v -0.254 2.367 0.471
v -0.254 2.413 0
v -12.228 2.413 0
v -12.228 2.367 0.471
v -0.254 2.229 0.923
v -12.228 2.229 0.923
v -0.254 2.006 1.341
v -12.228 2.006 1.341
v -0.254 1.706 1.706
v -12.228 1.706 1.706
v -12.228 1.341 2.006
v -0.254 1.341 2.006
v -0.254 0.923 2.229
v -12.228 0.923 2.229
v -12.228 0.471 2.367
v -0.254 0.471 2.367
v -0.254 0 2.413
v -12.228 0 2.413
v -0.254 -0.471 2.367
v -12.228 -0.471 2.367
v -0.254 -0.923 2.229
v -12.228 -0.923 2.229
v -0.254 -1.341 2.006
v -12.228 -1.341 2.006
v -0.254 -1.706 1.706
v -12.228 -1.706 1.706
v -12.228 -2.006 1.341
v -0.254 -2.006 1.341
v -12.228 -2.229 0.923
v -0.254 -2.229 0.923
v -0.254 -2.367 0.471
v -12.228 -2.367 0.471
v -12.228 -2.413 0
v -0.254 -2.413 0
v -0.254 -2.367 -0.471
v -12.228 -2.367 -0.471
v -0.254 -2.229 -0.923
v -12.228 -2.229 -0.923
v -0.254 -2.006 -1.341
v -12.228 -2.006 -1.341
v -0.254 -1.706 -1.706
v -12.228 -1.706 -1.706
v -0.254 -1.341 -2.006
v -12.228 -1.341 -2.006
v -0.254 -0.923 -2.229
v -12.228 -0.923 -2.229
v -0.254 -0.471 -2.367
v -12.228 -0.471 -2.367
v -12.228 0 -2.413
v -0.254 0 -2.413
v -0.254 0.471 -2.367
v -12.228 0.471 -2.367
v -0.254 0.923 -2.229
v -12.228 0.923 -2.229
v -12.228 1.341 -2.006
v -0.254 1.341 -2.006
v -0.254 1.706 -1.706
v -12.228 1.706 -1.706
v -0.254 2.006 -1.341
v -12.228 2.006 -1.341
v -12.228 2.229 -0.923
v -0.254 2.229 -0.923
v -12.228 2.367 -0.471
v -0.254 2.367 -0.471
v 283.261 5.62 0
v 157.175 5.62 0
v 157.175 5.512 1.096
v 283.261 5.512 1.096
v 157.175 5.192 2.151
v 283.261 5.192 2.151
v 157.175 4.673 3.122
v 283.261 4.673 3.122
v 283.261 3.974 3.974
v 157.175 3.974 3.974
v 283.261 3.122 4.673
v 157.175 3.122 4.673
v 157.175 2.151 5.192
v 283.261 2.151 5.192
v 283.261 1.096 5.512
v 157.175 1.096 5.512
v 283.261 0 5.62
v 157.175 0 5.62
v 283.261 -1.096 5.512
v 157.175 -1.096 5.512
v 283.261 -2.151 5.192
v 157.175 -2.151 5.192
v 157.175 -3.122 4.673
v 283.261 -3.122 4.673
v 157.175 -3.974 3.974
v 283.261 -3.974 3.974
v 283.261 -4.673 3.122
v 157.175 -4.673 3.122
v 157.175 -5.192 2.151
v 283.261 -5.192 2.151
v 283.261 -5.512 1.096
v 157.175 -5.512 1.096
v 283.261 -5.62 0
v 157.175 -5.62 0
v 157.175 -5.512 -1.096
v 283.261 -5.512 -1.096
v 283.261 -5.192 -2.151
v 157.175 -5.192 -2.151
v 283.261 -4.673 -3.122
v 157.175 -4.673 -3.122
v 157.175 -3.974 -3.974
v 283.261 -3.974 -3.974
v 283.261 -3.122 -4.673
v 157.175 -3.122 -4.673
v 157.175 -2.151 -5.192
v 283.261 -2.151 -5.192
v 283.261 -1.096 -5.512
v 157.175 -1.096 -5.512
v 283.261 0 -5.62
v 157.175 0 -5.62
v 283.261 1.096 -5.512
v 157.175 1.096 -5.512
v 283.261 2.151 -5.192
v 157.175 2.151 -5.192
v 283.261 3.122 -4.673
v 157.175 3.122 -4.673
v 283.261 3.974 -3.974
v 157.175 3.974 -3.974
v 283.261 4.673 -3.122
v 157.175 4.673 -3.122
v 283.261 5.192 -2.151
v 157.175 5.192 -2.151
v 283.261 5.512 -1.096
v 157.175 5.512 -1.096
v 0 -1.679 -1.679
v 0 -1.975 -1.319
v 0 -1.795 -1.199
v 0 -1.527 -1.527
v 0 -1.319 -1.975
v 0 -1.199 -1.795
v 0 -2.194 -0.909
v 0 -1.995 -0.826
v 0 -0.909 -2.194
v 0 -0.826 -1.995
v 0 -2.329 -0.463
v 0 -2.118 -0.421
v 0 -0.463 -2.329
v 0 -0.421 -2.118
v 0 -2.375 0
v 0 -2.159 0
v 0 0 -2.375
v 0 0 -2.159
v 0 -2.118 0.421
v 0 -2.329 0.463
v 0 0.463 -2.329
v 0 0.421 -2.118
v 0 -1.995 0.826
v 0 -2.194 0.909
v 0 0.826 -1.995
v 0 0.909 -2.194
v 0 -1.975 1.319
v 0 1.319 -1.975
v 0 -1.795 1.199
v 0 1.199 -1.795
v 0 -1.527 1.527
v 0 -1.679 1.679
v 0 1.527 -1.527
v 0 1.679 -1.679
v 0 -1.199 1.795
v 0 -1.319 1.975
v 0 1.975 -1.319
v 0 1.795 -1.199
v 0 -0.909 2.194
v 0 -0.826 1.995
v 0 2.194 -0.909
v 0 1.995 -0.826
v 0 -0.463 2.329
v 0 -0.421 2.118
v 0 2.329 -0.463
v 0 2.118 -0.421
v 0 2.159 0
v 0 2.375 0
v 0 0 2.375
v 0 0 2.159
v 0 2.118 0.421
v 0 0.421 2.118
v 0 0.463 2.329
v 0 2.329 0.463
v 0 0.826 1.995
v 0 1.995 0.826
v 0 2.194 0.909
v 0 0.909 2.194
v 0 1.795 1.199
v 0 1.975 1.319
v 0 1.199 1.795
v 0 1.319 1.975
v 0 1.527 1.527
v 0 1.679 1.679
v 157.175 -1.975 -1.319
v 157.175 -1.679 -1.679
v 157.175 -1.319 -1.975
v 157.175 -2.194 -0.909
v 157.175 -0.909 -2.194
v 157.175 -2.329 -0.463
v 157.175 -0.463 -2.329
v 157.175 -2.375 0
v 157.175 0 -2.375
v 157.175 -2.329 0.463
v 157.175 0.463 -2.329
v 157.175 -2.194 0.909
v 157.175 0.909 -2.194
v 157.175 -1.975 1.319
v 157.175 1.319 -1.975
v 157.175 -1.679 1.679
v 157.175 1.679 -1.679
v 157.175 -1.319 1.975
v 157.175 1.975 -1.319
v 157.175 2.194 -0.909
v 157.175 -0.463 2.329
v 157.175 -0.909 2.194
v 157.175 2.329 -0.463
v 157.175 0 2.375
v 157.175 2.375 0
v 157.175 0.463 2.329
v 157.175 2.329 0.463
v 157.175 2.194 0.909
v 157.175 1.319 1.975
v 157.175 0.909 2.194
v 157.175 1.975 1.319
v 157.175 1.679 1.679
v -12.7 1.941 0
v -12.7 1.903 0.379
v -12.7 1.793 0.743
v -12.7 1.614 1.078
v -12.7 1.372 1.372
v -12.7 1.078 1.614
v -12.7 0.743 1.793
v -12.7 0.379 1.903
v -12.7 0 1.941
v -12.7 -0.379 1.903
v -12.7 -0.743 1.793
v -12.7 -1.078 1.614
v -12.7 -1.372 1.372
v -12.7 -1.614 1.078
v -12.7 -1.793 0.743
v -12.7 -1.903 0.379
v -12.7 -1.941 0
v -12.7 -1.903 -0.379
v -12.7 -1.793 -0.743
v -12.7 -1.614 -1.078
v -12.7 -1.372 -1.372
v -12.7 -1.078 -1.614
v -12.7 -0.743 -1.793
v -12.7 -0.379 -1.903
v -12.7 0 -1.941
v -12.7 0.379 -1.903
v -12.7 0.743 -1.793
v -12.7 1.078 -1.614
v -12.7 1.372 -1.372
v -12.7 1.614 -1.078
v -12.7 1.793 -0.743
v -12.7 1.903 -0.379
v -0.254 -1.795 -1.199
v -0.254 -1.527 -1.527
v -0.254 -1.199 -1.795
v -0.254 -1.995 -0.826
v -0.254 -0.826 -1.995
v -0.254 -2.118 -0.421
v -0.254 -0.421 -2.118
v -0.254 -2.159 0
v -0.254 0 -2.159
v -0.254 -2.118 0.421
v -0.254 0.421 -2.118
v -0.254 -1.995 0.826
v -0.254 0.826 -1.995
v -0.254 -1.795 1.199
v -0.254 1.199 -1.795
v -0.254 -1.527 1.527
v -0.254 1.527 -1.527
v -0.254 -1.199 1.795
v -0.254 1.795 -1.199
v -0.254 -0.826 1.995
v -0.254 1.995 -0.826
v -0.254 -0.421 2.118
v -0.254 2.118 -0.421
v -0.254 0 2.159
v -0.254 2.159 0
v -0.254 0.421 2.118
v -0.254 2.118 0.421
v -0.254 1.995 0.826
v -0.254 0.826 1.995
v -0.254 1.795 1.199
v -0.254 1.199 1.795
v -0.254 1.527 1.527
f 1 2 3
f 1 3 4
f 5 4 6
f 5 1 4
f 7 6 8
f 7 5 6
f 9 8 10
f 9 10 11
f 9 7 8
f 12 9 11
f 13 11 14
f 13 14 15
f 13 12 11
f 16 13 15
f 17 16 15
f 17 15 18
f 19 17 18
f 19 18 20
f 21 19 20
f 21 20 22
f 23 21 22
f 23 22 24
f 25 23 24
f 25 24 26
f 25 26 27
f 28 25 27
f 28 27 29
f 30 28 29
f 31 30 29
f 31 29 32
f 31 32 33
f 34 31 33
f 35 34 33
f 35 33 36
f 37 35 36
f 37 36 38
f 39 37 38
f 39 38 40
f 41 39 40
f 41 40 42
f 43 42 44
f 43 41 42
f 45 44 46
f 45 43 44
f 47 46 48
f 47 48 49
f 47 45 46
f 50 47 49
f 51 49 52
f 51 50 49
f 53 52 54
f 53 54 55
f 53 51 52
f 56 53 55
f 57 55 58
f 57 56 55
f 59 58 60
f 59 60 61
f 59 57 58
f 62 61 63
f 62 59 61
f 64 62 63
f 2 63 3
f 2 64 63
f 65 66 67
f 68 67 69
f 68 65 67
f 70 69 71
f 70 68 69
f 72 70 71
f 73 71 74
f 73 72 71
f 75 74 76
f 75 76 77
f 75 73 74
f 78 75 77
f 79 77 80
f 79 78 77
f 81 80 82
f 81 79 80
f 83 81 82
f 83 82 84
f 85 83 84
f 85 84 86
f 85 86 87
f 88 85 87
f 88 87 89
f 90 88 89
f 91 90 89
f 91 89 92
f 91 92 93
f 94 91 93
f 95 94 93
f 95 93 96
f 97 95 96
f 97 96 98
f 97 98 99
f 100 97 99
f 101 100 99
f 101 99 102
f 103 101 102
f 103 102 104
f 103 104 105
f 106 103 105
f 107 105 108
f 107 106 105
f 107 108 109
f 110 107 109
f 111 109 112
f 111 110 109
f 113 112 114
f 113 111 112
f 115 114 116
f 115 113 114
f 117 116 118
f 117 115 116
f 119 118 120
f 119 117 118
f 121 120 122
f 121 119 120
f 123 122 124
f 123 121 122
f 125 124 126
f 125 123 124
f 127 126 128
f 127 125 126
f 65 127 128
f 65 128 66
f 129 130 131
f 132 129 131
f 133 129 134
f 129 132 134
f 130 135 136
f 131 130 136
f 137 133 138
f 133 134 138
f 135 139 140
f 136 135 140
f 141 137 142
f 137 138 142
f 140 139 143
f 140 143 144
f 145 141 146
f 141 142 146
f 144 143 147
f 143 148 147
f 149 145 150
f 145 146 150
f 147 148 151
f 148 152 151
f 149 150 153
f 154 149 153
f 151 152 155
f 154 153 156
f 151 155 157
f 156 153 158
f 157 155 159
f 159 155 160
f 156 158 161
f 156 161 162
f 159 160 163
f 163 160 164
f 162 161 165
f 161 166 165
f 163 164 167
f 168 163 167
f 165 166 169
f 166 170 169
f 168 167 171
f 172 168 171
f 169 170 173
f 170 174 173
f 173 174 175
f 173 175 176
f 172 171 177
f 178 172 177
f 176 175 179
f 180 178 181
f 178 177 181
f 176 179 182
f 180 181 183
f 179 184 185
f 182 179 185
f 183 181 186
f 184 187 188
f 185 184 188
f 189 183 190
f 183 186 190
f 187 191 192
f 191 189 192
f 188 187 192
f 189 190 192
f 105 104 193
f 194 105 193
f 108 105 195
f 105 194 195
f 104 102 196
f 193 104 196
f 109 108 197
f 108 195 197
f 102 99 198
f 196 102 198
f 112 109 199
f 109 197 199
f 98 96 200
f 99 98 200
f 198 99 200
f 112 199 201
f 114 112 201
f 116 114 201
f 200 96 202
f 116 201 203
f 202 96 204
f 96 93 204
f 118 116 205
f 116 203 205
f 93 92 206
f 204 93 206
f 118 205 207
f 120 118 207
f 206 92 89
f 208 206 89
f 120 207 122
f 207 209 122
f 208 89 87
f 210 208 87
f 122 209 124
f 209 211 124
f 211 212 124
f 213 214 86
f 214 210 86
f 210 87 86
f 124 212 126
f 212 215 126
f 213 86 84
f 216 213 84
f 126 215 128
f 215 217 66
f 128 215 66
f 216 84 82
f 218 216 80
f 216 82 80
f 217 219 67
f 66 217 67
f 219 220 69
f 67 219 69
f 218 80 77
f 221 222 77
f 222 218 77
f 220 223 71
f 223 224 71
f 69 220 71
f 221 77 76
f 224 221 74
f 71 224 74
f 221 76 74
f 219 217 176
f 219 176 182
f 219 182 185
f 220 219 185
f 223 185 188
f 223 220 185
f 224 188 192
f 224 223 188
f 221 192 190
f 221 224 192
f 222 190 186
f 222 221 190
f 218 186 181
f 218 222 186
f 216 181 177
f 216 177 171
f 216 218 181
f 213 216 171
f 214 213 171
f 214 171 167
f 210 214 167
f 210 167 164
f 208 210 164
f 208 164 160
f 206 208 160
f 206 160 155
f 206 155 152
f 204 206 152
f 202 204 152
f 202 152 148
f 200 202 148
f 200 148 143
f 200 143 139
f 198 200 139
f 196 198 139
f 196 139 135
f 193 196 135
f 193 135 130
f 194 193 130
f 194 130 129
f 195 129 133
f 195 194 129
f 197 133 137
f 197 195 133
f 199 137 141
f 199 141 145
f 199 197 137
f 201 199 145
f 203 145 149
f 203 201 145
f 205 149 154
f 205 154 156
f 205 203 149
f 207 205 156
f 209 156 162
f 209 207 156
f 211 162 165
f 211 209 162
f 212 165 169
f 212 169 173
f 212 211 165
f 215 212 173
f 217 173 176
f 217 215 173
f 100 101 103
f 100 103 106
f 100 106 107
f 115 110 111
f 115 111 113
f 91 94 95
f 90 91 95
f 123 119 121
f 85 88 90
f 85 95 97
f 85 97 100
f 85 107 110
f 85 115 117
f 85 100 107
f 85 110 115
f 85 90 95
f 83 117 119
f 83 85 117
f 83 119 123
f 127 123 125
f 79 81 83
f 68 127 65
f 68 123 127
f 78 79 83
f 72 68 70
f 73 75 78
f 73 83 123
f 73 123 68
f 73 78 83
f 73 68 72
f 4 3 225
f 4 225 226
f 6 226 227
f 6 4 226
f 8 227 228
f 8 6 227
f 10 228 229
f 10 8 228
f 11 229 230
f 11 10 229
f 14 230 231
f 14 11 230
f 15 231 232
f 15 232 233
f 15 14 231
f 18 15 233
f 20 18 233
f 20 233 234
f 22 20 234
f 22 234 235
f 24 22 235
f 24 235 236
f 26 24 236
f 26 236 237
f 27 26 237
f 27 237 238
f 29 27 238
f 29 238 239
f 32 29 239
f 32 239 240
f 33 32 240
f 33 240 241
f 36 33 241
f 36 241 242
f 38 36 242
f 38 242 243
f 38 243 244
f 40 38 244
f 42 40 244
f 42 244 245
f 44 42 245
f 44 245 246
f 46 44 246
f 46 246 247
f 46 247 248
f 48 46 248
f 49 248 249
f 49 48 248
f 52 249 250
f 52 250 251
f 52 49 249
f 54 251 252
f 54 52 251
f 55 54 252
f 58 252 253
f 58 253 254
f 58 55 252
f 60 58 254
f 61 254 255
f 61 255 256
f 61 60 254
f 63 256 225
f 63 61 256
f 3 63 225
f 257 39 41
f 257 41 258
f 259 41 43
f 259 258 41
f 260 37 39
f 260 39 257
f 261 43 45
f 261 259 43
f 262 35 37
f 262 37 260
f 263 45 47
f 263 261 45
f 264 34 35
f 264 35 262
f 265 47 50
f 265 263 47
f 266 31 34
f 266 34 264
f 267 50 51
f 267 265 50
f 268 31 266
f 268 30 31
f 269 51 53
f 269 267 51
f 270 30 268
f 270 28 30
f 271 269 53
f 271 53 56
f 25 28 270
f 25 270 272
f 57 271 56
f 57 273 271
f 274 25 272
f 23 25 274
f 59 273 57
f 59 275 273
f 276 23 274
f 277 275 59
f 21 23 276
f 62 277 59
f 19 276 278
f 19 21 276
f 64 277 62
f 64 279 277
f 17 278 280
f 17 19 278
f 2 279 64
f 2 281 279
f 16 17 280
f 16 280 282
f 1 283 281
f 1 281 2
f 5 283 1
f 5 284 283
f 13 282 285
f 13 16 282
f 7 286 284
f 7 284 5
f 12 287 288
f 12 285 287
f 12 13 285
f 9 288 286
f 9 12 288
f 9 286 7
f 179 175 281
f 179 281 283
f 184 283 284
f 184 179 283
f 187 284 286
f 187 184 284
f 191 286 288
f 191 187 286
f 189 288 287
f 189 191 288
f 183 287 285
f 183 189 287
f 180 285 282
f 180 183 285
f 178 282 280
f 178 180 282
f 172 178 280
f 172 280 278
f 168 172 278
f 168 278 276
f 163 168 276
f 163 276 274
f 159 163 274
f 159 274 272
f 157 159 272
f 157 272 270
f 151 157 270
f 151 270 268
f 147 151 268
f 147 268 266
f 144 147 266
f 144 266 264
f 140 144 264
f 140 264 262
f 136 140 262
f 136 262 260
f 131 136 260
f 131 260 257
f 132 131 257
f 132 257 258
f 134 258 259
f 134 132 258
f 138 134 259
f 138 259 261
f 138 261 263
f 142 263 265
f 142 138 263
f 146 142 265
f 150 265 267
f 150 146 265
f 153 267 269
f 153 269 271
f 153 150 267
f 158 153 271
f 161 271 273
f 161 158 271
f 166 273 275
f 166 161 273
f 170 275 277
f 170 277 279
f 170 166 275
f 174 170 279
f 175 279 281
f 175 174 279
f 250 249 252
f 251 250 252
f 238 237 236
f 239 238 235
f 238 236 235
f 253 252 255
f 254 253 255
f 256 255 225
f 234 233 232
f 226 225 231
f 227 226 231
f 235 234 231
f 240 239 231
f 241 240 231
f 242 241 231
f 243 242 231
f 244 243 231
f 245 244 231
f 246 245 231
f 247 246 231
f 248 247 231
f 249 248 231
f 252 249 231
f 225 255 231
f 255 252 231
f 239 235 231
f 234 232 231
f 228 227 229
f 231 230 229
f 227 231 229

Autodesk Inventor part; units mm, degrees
sketch "Sketch_1" plane through (0, 0, 0) normal (0, 0, 1) x (1, 0, 0)
  line L0 (283.2608, 0) -> (0, 0)
  line L1 (0, 0) -> (0, 2.3749)
  line L2 (0, 2.3749) -> (157.1752, 2.3749)
  line L3 (157.1752, 2.3749) -> (157.1752, 5.6197)
  line L4 (157.1752, 5.6197) -> (283.2608, 5.6197)
  line L5 (283.2608, 5.6197) -> (283.2608, 0)
  line L6 (283.2608, 0) -> (0, 0)
revolve "Revolution1" add sketch "Sketch_1" angle 360 about axis through (283.2608, 0, 0) along (1, 0, 0)
sketch "Sketch_3" plane through (0, 0, 0) normal (0, 0, 1) x (1, 0, 0)
  line L0 (0, 0) -> (-12.7, 0)
  line L1 (-12.7, 0) -> (-12.7, 1.9406)
  line L2 (-12.7, 1.9406) -> (-12.2276, 2.413)
  line L3 (-12.2276, 2.413) -> (0, 2.413)
  line L4 (0, 2.413) -> (0, 0)
  line L5 (0, 0) -> (-12.7, 0)
revolve "Revolution2" add sketch "Sketch_3" angle 360 about axis through (0, 0, 0) along (1, 0, 0)
thread "Thread1" size "10-32 UNF" class "2A" standard "ANSI Unified Screw Threads" full length
sketch "Sketch_30" plane through (0, 0, 0) normal (0, 0, 1) x (1, 0, 0)
  line L0 (0, 0) -> (-0.254, 0)
  line L1 (-0.254, 2.159) -> (0, 2.159)
  line L2 (0, 2.159) -> (0, 2.667)
  line L3 (0, 2.667) -> (-0.254, 2.667)
  line L4 (-0.254, 2.667) -> (-0.254, 2.159)
revolve "Revolution3" cut sketch "Sketch_30" angle 360 about axis through (0, 0, 0) along (1, 0, 0)
ref_plane "dia1_XY" through (0, 2.3749, 0) normal (1, 0, 0) x (0, 0, -1)
ref_plane "dia1_YZ" through (0, 2.3749, 0) normal (0, 0, -1) x (0, 1, 0)
ref_plane "dia1_ZX" through (0, 2.3749, 0) normal (0, 1, 0) x (1, 0, 0)
ref_plane "dia12_XY" through (0, 0, 6.1468) normal (1, 0, 0) x (0, 0, -1)
ref_plane "dia12_YZ" through (0, 0, 6.1468) normal (0, 0, -1) x (0, 1, 0)
ref_plane "dia12_ZX" through (0, 0, 6.1468) normal (0, 1, 0) x (1, 0, 0)
ref_plane "dia1r_XY" through (0, 0, 9.3726) normal (1, 0, 0) x (0, 0, -1)
ref_plane "dia1r_YZ" through (0, 0, 9.3726) normal (0, 0, -1) x (0, 1, 0)
ref_plane "dia1r_ZX" through (0, 0, 9.3726) normal (0, 1, 0) x (1, 0, 0)
ref_plane "dia2_XY" through (0, -2.3749, 0) normal (1, 0, 0) x (0, 0, -1)
ref_plane "dia2_YZ" through (0, -2.3749, 0) normal (0, 0, -1) x (0, 1, 0)
ref_plane "dia2_ZX" through (0, -2.3749, 0) normal (0, 1, 0) x (1, 0, 0)
ref_plane "dia22_XY" through (0, 0, -6.1468) normal (1, 0, 0) x (0, 0, -1)
ref_plane "dia22_YZ" through (0, 0, -6.1468) normal (0, 0, -1) x (0, 1, 0)
ref_plane "dia22_ZX" through (0, 0, -6.1468) normal (0, 1, 0) x (1, 0, 0)
ref_plane "dia2r_XY" through (0, 0, -9.3726) normal (1, 0, 0) x (0, 0, -1)
ref_plane "dia2r_YZ" through (0, 0, -9.3726) normal (0, 0, -1) x (0, 1, 0)
ref_plane "dia2r_ZX" through (0, 0, -9.3726) normal (0, 1, 0) x (1, 0, 0)
ref_plane "rl1_XY" through (-12.7, 0, 0) normal (1, 0, 0) x (0, 0, -1)
ref_plane "rl1_YZ" through (-12.7, 0, 0) normal (0, 0, -1) x (0, 1, 0)
ref_plane "rl1_ZX" through (-12.7, 0, 0) normal (0, 1, 0) x (1, 0, 0)
ref_plane "rl2_XY" through (0, 0, 0) normal (1, 0, 0) x (0, 0, -1)
ref_plane "rl2_YZ" through (0, 0, 0) normal (0, 0, -1) x (0, 1, 0)
ref_plane "rl2_ZX" through (0, 0, 0) normal (0, 1, 0) x (1, 0, 0)
ref_plane "rod_cp_XY" through (0, 0, 0) normal (1, 0, 0) x (0, 0, -1)
ref_plane "rod_cp_YZ" through (0, 0, 0) normal (0, 0, -1) x (0, 1, 0)
ref_plane "rod_cp_ZX" through (0, 0, 0) normal (0, 1, 0) x (1, 0, 0)
ref_plane "thd1_XY" through (-12.7, 2.413, 0) normal (1, 0, 0) x (0, 0, -1)
ref_plane "thd1_YZ" through (-12.7, 2.413, 0) normal (0, 0, -1) x (0, 1, 0)
ref_plane "thd1_ZX" through (-12.7, 2.413, 0) normal (0, 1, 0) x (1, 0, 0)
ref_plane "thd2_XY" through (-12.7, -2.413, 0) normal (1, 0, 0) x (0, 0, -1)
ref_plane "thd2_YZ" through (-12.7, -2.413, 0) normal (0, 0, -1) x (0, 1, 0)
ref_plane "thd2_ZX" through (-12.7, -2.413, 0) normal (0, 1, 0) x (1, 0, 0)
ref_plane "to_rod_clevis_XY" through (-12.7, 0, 0) normal (1, 0, 0) x (0, 0, -1)
ref_plane "to_rod_clevis_YZ" through (-12.7, 0, 0) normal (0, 0, -1) x (0, 1, 0)
ref_plane "to_rod_clevis_ZX" through (-12.7, 0, 0) normal (0, 1, 0) x (1, 0, 0)
properties part number "015.5-P0000_rod"
